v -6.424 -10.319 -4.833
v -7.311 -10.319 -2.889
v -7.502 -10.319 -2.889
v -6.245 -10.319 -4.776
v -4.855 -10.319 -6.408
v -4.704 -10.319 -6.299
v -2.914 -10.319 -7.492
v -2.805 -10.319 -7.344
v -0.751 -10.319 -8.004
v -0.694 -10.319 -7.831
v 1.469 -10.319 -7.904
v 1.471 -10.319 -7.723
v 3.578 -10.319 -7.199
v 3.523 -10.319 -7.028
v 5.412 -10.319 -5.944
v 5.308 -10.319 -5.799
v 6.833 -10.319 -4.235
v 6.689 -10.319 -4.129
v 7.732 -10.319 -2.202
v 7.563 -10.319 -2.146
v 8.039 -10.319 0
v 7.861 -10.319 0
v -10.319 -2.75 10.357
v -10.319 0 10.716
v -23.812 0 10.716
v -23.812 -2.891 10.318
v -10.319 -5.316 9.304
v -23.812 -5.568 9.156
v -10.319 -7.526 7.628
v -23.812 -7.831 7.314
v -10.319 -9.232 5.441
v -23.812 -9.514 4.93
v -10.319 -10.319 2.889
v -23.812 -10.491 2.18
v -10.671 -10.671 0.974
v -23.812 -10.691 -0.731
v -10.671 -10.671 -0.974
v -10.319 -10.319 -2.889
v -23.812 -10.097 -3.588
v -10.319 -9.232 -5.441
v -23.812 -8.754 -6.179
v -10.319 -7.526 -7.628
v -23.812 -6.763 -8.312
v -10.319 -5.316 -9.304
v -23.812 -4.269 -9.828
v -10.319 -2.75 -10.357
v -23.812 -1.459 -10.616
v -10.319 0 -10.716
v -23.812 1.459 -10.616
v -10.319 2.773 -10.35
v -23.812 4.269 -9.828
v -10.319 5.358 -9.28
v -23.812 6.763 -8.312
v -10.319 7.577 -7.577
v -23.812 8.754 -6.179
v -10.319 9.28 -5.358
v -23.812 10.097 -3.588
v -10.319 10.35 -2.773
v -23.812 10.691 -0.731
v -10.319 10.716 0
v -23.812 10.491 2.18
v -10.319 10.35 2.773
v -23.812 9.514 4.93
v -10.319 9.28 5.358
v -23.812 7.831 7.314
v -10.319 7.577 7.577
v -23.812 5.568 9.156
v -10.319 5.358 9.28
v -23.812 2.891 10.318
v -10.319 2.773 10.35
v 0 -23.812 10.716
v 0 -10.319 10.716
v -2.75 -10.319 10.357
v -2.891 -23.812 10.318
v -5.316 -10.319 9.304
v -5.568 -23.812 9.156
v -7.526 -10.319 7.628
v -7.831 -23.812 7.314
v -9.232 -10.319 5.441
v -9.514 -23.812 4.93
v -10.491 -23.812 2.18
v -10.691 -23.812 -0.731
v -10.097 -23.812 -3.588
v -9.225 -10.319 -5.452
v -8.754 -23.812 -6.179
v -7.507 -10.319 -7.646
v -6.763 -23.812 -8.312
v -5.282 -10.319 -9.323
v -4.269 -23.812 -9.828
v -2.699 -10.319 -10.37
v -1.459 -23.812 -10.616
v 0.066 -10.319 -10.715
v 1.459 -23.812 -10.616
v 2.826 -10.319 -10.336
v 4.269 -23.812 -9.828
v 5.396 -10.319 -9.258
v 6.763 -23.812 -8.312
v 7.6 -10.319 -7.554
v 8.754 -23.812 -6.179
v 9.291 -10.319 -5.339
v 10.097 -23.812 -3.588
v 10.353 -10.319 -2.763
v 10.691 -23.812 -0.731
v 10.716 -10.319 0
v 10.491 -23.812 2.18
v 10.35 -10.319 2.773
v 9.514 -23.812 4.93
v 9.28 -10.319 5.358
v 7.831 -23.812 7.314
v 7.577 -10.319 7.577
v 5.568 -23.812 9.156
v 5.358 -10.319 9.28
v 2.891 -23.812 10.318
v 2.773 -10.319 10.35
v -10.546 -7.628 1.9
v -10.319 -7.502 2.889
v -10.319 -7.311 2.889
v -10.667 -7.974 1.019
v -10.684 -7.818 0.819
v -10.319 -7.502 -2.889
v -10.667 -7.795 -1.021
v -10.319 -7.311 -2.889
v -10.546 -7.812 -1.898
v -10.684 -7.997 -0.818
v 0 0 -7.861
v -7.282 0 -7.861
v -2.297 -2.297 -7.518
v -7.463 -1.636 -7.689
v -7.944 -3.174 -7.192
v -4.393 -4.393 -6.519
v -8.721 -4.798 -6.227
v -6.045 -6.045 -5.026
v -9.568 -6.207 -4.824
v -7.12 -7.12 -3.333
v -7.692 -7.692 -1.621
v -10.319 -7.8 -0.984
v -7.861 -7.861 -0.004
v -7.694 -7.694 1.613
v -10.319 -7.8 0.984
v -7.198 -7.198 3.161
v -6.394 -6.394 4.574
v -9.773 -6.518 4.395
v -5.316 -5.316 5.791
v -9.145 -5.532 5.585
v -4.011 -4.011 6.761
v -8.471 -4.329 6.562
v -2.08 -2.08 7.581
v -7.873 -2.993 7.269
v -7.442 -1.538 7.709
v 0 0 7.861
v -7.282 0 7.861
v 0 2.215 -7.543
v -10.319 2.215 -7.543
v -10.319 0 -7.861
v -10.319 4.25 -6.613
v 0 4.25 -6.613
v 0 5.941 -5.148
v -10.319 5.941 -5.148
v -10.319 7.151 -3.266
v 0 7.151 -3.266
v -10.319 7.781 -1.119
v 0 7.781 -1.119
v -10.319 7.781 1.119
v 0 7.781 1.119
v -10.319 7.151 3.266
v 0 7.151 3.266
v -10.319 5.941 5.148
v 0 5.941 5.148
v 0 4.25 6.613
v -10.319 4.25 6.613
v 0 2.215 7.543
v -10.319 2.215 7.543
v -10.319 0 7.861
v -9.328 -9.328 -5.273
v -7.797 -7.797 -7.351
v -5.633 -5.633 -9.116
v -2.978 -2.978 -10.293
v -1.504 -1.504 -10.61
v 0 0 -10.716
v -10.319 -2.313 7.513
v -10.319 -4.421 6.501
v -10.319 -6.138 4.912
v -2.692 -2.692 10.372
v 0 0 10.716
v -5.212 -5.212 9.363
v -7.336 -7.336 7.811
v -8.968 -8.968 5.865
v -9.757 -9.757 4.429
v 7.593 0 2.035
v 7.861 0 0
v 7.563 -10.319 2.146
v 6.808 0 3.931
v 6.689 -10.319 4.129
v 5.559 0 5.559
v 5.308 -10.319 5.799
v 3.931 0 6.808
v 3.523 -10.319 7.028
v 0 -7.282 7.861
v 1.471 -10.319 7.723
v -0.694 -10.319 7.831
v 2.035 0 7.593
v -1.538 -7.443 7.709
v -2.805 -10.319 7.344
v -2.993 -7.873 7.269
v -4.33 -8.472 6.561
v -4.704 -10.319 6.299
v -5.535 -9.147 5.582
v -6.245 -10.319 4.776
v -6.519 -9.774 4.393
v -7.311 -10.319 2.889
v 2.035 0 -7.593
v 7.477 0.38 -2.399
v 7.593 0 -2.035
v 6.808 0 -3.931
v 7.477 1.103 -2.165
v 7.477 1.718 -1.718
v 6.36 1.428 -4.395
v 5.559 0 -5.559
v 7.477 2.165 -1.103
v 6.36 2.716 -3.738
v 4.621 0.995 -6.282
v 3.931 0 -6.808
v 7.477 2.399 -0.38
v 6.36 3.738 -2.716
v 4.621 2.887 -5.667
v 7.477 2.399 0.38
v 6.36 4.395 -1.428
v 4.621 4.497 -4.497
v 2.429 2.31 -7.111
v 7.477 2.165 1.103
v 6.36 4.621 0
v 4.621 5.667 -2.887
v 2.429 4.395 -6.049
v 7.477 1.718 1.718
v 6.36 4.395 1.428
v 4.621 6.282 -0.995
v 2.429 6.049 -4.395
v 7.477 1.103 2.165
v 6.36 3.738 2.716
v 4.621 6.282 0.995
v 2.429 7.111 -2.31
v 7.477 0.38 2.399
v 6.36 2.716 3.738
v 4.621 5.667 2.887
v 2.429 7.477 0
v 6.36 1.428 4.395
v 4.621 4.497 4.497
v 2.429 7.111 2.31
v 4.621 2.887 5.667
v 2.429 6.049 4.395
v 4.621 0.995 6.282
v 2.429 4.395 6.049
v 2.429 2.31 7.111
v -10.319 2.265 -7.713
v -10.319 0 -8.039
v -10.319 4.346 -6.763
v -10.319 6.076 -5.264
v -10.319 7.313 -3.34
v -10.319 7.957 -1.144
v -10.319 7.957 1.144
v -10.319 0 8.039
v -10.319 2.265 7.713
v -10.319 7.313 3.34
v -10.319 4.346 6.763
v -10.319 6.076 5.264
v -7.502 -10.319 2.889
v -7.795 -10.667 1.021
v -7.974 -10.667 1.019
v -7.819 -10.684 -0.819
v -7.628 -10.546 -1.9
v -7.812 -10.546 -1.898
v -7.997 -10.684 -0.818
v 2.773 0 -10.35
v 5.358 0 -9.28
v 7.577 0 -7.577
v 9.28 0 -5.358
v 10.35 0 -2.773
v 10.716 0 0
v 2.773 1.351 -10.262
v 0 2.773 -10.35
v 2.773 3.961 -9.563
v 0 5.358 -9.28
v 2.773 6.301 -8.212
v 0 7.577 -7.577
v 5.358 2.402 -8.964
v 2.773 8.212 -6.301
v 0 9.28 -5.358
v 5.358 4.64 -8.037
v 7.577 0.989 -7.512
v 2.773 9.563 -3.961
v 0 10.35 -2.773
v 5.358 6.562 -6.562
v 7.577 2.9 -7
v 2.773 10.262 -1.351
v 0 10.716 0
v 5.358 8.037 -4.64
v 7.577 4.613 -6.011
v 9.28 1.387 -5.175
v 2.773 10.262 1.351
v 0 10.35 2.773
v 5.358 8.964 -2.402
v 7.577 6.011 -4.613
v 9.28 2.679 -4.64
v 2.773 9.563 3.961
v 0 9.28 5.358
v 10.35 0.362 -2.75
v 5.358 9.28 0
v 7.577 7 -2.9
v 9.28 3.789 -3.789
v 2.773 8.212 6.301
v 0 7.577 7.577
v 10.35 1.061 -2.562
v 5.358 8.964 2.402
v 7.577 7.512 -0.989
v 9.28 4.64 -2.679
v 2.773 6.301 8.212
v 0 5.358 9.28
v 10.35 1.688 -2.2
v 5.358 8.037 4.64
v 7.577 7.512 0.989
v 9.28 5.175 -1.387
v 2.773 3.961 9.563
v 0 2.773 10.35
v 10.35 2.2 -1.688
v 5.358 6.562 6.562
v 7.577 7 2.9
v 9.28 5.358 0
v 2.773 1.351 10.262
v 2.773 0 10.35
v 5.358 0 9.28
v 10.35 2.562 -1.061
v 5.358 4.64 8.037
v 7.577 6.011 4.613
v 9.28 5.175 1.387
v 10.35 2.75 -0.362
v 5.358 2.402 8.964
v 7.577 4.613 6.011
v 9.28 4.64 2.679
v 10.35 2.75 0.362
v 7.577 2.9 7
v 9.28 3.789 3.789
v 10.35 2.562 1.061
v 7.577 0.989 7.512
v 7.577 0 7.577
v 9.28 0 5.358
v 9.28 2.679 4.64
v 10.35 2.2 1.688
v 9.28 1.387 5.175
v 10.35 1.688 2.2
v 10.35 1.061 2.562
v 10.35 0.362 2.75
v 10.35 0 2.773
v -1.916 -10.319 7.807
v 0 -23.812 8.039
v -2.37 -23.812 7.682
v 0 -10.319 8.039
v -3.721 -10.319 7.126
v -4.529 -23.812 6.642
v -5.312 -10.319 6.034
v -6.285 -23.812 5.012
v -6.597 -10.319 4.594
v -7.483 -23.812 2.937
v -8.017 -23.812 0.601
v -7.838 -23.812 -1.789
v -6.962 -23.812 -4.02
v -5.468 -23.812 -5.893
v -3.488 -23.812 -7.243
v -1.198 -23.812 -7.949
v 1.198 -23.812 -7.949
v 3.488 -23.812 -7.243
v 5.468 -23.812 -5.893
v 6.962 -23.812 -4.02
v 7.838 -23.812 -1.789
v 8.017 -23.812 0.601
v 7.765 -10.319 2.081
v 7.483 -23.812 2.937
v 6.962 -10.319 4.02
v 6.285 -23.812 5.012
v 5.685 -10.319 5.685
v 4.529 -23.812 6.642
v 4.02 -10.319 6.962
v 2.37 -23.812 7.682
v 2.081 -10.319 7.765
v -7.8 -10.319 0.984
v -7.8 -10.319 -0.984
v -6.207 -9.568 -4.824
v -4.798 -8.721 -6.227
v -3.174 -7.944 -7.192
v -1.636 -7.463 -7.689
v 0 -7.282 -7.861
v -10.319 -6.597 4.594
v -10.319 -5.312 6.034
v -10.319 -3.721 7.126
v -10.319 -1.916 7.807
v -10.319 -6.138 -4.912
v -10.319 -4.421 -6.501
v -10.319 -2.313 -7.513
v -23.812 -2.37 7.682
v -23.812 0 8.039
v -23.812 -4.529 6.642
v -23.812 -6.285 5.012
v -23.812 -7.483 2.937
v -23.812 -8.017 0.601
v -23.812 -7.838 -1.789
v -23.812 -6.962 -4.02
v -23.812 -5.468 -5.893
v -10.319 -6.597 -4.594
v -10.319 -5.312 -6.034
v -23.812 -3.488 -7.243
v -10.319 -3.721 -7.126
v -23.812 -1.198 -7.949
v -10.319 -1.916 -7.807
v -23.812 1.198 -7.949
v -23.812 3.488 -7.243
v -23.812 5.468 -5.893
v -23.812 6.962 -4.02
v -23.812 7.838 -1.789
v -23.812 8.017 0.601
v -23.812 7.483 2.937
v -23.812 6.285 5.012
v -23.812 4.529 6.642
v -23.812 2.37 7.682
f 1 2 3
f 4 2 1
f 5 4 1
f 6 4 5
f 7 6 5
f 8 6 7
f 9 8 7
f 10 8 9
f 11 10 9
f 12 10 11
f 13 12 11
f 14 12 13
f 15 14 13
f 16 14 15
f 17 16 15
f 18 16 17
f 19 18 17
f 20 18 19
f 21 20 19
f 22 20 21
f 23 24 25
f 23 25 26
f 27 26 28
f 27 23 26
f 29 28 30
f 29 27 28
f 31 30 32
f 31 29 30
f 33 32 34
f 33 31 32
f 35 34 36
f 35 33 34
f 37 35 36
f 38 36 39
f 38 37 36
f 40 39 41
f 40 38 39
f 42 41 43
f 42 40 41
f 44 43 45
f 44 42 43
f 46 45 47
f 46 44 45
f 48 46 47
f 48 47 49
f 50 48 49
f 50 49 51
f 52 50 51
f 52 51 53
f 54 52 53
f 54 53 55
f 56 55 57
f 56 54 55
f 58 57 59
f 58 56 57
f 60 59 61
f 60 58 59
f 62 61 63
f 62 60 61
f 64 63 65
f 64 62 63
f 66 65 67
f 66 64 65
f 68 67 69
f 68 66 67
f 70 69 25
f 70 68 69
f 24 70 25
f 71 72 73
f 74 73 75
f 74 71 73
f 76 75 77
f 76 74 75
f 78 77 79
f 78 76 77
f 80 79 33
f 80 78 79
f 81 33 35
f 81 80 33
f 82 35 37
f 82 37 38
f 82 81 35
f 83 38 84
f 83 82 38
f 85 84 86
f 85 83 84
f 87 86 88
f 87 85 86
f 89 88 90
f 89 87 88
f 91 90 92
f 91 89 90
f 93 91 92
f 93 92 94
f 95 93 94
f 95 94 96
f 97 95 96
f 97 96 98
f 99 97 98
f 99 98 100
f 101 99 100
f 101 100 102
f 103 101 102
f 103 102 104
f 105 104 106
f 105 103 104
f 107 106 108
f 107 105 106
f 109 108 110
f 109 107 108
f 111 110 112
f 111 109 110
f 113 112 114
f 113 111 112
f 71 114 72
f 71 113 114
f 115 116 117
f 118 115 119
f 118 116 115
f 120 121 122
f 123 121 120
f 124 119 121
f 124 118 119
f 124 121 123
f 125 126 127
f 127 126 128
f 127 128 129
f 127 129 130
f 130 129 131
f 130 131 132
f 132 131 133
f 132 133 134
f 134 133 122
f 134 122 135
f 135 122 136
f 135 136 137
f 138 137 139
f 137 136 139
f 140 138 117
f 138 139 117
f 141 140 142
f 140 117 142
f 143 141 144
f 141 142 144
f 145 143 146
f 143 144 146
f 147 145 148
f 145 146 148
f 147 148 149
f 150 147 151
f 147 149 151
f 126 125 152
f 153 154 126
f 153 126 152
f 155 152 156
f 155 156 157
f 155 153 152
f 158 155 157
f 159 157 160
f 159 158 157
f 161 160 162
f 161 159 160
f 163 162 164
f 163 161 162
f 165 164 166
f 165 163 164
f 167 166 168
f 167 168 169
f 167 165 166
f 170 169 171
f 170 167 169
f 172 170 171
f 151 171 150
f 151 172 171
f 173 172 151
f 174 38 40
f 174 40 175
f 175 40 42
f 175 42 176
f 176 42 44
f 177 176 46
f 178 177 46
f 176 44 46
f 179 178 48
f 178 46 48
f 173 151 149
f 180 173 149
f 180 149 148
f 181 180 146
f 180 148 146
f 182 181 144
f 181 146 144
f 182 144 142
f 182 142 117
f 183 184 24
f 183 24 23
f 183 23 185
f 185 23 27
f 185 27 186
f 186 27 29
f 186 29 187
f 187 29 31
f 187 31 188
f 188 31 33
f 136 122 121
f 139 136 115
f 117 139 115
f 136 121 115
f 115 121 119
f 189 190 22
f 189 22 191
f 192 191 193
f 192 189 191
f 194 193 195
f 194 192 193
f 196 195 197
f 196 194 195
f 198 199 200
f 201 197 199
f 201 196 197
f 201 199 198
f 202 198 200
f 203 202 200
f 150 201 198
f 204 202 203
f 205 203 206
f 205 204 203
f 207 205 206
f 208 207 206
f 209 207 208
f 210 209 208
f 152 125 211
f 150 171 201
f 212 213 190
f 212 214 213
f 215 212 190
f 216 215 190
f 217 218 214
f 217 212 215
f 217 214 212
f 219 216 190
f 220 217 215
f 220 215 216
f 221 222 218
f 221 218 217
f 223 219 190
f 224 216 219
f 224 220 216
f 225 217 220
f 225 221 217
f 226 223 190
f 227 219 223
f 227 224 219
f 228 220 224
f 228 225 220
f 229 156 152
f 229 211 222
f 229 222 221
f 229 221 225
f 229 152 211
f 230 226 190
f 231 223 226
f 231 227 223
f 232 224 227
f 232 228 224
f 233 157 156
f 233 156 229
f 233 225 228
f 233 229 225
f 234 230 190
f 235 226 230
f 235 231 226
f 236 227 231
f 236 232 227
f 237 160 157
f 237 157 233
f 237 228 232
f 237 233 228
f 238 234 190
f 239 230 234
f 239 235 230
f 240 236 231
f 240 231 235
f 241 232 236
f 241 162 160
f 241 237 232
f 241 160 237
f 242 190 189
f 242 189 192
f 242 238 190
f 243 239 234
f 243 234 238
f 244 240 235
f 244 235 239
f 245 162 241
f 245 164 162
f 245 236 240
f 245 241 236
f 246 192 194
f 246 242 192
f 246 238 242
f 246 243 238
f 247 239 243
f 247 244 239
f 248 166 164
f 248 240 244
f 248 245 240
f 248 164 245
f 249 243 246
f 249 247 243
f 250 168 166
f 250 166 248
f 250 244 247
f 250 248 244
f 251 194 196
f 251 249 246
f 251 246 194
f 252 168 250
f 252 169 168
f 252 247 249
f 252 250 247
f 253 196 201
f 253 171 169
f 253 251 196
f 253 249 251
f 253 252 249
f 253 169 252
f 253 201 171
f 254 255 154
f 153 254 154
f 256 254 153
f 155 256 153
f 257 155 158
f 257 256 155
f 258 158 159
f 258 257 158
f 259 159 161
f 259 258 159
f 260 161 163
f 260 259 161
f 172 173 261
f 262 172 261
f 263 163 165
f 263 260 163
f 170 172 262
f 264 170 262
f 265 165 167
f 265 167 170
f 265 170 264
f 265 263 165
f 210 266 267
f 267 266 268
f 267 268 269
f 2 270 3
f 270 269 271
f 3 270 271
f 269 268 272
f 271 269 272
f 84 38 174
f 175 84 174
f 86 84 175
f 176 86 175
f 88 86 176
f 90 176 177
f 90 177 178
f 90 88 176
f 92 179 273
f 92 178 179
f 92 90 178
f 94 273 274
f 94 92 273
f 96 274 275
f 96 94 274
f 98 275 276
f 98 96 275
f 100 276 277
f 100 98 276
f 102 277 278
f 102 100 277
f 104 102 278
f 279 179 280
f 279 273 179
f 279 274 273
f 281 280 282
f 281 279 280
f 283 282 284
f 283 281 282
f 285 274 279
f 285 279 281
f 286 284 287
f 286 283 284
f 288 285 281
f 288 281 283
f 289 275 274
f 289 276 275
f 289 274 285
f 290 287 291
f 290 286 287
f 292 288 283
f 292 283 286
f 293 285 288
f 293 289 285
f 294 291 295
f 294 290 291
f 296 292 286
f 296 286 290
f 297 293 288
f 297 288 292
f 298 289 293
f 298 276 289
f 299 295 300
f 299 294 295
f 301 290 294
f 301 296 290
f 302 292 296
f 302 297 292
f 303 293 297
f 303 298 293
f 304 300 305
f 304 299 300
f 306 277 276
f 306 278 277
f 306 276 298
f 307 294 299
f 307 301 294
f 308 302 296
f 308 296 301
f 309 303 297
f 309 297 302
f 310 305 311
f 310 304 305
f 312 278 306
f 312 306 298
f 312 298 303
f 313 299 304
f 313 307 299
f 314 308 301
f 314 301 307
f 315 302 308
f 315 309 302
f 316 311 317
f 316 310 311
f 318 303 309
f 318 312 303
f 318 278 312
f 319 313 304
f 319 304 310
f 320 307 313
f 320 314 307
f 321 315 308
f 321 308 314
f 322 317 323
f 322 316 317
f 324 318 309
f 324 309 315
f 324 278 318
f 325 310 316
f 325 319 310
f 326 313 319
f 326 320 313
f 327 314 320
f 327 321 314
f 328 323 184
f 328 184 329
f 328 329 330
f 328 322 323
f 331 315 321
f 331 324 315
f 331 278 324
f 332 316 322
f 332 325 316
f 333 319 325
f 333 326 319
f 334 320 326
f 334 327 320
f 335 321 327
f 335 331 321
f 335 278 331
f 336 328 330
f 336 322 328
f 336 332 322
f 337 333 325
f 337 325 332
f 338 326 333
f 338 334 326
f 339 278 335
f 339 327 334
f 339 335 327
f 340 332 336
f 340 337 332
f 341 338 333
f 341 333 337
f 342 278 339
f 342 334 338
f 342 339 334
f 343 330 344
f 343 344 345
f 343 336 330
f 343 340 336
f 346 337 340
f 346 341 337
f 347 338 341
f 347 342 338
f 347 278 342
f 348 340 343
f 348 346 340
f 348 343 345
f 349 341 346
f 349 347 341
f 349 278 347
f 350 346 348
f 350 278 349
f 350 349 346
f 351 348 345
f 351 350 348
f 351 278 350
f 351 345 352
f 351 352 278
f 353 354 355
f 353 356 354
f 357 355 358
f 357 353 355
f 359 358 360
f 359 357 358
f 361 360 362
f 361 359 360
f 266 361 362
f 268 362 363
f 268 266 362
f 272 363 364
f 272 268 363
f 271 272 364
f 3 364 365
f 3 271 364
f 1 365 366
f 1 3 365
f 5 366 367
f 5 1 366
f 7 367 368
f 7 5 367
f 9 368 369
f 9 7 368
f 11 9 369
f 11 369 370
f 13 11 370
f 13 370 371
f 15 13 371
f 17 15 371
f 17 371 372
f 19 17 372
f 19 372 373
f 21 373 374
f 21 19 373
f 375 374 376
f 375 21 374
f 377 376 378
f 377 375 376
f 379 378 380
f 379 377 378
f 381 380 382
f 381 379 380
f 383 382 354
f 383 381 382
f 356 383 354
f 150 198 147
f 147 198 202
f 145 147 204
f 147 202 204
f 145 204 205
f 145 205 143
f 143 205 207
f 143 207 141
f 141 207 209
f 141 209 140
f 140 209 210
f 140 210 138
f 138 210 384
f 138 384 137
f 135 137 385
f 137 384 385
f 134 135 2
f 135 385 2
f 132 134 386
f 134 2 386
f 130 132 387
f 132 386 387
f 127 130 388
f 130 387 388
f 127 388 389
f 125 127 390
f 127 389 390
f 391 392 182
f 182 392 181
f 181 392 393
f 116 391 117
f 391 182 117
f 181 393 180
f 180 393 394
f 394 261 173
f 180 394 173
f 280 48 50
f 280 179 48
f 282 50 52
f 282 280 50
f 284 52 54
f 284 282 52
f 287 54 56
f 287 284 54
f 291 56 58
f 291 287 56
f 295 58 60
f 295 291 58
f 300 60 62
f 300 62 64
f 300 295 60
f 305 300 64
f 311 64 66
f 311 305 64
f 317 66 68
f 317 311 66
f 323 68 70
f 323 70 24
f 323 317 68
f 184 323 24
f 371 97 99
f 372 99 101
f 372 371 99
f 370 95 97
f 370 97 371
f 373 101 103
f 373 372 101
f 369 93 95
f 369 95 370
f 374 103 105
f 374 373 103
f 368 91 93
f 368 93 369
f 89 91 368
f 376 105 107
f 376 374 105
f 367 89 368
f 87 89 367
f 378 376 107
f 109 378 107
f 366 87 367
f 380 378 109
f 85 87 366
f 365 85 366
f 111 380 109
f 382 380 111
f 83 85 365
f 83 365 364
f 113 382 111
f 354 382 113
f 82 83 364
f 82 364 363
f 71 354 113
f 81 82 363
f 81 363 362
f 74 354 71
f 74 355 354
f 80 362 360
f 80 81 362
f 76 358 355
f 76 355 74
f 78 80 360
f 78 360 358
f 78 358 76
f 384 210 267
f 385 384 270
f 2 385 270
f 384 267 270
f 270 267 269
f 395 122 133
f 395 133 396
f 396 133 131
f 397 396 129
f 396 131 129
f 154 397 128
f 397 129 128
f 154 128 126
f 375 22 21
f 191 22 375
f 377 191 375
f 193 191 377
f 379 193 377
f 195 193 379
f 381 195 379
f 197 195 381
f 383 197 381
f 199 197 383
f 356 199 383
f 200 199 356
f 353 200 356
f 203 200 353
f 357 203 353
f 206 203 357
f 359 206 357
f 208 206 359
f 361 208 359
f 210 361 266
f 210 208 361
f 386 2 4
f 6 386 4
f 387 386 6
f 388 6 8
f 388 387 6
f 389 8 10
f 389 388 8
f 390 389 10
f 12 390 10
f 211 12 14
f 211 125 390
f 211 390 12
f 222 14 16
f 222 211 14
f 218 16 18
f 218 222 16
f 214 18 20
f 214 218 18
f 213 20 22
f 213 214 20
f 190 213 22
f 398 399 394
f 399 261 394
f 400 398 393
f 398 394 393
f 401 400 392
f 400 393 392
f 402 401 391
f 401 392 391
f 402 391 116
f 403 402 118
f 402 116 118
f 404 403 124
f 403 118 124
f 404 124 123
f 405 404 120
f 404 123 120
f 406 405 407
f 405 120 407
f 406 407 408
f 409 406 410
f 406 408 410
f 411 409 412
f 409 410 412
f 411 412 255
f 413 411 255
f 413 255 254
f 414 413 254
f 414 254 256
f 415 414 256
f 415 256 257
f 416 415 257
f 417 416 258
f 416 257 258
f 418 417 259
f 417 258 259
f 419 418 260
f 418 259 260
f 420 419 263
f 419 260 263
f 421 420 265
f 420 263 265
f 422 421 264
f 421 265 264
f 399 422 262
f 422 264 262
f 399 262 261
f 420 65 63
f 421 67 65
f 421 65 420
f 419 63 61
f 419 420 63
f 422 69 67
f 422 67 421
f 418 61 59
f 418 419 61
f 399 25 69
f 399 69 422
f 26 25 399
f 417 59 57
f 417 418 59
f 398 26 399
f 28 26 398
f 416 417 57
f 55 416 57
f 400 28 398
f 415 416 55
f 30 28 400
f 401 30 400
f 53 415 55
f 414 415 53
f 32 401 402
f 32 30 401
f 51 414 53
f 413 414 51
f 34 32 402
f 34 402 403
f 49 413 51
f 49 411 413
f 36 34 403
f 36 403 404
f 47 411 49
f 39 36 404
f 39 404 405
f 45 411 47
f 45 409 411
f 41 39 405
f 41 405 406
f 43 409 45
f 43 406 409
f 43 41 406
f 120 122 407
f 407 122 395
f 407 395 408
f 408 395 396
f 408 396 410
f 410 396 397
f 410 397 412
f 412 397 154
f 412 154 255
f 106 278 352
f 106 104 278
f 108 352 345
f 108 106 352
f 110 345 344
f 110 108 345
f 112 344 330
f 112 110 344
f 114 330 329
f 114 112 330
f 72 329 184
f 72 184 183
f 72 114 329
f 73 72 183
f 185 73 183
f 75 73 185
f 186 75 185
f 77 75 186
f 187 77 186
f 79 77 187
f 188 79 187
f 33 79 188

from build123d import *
from build123d.topology import SkipClean

# Parameters (mm, degrees)
SKETCH1_W    = 13.493749999999999
SKETCH1_H    = 2.676524999999998
SWEEP2_ANGLE = 180
SKETCH12_R   = 7.861299999999998
SKETCH12_2_R = 7.861299999999998
SKETCH16_R   = 7.861299999999998
SKETCH16_2_R = 7.861299999999998


# Read off the part's stored shape, not the designer's step: Sweep2
with BuildPart() as part:
    # Sketch1 → Revolve1 (revolve)
    with BuildSketch(Plane.XY, mode=Mode.PRIVATE) as revolve1_sk:
        with Locations((-17.065625, 9.3773625)):
            Rectangle(SKETCH1_W, SKETCH1_H)
    revolve(revolve1_sk.sketch.rotate(Axis((-34.18819835941514, 0, 0), (1, 0, 0)), 90), axis=Axis((-34.18819835941514, 0, 0), (1, 0, 0)))

    # Sketch2 → Revolve2 (revolve)
    with BuildSketch(Plane.XY, mode=Mode.PRIVATE) as revolve2_sk:
        Polygon((8.039100000000003, -10.31875), (10.715625000000001, -10.31875), (10.715625000000003, -23.8125), (8.039100000000003, -23.8125), align=None)
    revolve(revolve2_sk.sketch.rotate(Axis((0, 0, 0), (0, -1, 0)), 90), axis=Axis((0, 0, 0), (0, -1, 0)))

    # Sweep2 outline → Sweep2 (revolve)
    with SkipClean():  # the faces are left unmerged after this step: merging them gives an invalid solid
        with BuildSketch(Plane(origin=(0, 0, 0), x_dir=(0, 6e-17, -1), z_dir=(0, -1, -6e-17))):
            with BuildLine():
                Line((10.715625, -10.31875), (10.715625, 0))
                ThreePointArc((10.715625, 0), (7.577091102, 7.577091102), (0, 10.715625))
                Line((0, 10.715625), (0, 7.8613))
                ThreePointArc((0, 7.8613), (5.558778539, 5.558778539), (7.8613, 0))
                Line((7.8613, 0), (7.8613, -10.31875))
                Line((7.8613, -10.31875), (10.715625, -10.31875))
            make_face()
        revolve(axis=Axis((0, 0, 0), (1, 0, 0)), revolution_arc=SWEEP2_ANGLE)

    # Sweep3: sweep along a path in Sketch9
    with SkipClean():  # the faces are left unmerged after this step: merging them gives an invalid solid
        with BuildLine(Plane.XZ) as sweep3_path:
            CenterArc((0, 0), 10.715625, 0, 360)
        # Sketch8 → Sweep3 (sweep)
        with BuildSketch(Plane(origin=(0, 0, 0), x_dir=(0, 0, -1), z_dir=(1, 0, 0))):
            Polygon((-10.715625000000003, 7e-17), (-7.861299999999998, 0), (-7.861299999999998, -10.318750000000001), (-10.715625000000003, -10.318750000000001), align=None)
        sweep(path=sweep3_path.line)

    # Sweep4: sweep along a path in Sketch10
    with BuildLine(Plane(origin=(-10.318750000000001, 0, 0), x_dir=(0, 0, -1), z_dir=(1, 0, 0))) as sweep4_path:
        ThreePointArc((-10.715625, -3.87e-15), (6.6e-16, -10.715625), (10.715625, -3.87e-15))
    # Sketch11 → Sweep4 (sweep)
    with BuildSketch(Plane.XZ):
        Polygon((-10.318750000000001, 10.715625), (1.19e-15, 10.715625), (1.54e-15, 7.861299999999998), (-10.318750000000001, 7.861299999999998), align=None)
    sweep(path=sweep4_path.line)

    # Cut-Sweep3: sweep along a path in Sketch14
    with BuildLine(Plane.XY) as cut_sweep3_path:
        Line((1.73e-15, 8.039100000000001), (-10.318750000000001, 8.0391))
    # Sketch12 → Cut-Sweep3 (sweep, cut)
    with BuildSketch(Plane.ZY.offset(10.318750000000001)):
        Circle(SKETCH12_R)
    sweep(path=cut_sweep3_path.line, mode=Mode.SUBTRACT)

    # Cut-Sweep4: sweep along a path in Sketch15
    with BuildLine(Plane.XY) as cut_sweep4_path:
        Line((-10.318750000000001, 5.616092889966187), (-23.8125, 5.616092889966185))
    # Sketch12<2> → Cut-Sweep4 (sweep, cut)
    with BuildSketch(Plane.ZY.offset(10.318750000000001)):
        Circle(SKETCH12_2_R)
    sweep(path=cut_sweep4_path.line, mode=Mode.SUBTRACT)

    # Cut-Sweep6: sweep along a path in Sketch17
    with BuildLine(Plane.XY) as cut_sweep6_path:
        Line((7.861299999999998, 0), (7.861299999999998, -10.318750000000001))
    # Sketch16 → Cut-Sweep6 (sweep, cut)
    with BuildSketch(Plane.XZ.offset(10.318750000000001)):
        Circle(SKETCH16_R)
    sweep(path=cut_sweep6_path.line, mode=Mode.SUBTRACT)

    # Cut-Sweep7: sweep along a path in Sketch18
    with BuildLine(Plane.XY) as cut_sweep7_path:
        Line((-7.861299999999989, -10.318750000000001), (-7.8612999999999875, -23.8125))
    # Sketch16<2> → Cut-Sweep7 (sweep, cut)
    with BuildSketch(Plane.XZ.offset(10.318750000000001)):
        Circle(SKETCH16_2_R)
    sweep(path=cut_sweep7_path.line, mode=Mode.SUBTRACT)


solid = part.part
